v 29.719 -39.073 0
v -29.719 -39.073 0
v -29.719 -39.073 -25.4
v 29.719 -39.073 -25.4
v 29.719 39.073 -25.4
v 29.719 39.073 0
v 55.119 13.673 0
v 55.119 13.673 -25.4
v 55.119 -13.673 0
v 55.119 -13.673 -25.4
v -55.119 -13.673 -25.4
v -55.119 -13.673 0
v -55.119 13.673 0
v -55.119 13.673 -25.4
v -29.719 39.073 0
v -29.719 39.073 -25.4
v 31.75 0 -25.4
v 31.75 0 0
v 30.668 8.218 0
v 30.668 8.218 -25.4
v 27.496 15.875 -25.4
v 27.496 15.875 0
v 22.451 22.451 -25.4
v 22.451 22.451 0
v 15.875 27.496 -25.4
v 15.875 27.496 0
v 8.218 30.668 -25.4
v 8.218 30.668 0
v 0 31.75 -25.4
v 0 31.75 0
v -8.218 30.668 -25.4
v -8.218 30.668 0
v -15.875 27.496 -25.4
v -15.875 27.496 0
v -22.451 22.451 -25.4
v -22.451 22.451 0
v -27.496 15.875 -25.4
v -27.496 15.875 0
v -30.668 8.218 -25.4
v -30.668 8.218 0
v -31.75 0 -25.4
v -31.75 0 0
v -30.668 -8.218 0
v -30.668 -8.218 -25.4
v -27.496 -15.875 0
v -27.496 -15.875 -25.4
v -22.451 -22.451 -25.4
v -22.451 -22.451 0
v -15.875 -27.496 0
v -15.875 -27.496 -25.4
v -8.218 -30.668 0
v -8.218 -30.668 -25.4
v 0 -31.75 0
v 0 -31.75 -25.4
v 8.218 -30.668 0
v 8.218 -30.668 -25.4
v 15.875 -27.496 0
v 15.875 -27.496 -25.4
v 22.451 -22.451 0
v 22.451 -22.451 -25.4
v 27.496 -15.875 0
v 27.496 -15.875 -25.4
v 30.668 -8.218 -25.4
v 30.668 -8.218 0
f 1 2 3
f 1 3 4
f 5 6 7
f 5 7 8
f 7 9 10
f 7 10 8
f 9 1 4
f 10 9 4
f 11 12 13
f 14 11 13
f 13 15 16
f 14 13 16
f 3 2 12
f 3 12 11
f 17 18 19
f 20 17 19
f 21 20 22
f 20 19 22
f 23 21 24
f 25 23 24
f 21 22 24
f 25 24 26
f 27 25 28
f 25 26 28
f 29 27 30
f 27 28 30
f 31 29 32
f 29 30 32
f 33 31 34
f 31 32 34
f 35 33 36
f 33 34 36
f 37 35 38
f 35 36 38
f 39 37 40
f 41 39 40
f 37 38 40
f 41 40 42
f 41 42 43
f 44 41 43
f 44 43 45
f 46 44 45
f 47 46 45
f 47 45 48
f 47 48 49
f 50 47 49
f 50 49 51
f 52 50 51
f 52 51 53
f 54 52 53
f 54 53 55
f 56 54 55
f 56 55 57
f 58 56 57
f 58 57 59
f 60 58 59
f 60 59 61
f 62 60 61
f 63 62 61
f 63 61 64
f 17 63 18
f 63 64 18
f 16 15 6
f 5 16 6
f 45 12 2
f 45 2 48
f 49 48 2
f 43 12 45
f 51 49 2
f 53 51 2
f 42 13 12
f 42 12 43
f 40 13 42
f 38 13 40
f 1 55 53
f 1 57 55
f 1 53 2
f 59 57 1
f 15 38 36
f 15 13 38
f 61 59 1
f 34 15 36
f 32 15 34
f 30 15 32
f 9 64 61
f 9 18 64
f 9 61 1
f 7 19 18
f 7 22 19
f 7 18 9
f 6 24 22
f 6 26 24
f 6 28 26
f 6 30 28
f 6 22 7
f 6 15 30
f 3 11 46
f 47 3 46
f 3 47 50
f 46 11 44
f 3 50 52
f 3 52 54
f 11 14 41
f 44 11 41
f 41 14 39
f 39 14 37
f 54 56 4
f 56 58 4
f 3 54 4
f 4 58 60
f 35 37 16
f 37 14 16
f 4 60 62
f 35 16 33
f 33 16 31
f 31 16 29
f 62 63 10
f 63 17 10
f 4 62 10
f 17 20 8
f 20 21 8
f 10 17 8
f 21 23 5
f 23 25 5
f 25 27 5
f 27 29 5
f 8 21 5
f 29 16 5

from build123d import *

# Parameters (mm, degrees)
SKETCH1_W           = 110.237040332
SKETCH1_H           = 78.14500721
BOSS_EXTRUDE1_DEPTH = 25.4
SKETCH2_R           = 31.75
CUT_EXTRUDE1_DEPTH  = 73.179441694
CHAMFER1_SIZE       = 25.4


with BuildPart() as part:
    # Sketch1 → Boss-Extrude1 (new body)
    with BuildSketch(Plane.XY):
        Rectangle(SKETCH1_W, SKETCH1_H)
    extrude(amount=-BOSS_EXTRUDE1_DEPTH)

    # Sketch2 → Cut-Extrude1 (cut, through all)
    with BuildSketch(Plane.XY):
        Circle(SKETCH2_R)
    extrude(amount=-CUT_EXTRUDE1_DEPTH, mode=Mode.SUBTRACT)

    # Chamfer1
    chamfer1_edges = [part.edges().sort_by_distance(p)[0] for p in [
        (55.118520166, -39.072503605, -12.7),
        (-55.118520166, -39.072503605, -12.7),
        (-55.118520166, 39.072503605, -12.7),
        (55.118520166, 39.072503605, -12.7),
    ]]
    chamfer(chamfer1_edges, length=CHAMFER1_SIZE)


solid = part.part
